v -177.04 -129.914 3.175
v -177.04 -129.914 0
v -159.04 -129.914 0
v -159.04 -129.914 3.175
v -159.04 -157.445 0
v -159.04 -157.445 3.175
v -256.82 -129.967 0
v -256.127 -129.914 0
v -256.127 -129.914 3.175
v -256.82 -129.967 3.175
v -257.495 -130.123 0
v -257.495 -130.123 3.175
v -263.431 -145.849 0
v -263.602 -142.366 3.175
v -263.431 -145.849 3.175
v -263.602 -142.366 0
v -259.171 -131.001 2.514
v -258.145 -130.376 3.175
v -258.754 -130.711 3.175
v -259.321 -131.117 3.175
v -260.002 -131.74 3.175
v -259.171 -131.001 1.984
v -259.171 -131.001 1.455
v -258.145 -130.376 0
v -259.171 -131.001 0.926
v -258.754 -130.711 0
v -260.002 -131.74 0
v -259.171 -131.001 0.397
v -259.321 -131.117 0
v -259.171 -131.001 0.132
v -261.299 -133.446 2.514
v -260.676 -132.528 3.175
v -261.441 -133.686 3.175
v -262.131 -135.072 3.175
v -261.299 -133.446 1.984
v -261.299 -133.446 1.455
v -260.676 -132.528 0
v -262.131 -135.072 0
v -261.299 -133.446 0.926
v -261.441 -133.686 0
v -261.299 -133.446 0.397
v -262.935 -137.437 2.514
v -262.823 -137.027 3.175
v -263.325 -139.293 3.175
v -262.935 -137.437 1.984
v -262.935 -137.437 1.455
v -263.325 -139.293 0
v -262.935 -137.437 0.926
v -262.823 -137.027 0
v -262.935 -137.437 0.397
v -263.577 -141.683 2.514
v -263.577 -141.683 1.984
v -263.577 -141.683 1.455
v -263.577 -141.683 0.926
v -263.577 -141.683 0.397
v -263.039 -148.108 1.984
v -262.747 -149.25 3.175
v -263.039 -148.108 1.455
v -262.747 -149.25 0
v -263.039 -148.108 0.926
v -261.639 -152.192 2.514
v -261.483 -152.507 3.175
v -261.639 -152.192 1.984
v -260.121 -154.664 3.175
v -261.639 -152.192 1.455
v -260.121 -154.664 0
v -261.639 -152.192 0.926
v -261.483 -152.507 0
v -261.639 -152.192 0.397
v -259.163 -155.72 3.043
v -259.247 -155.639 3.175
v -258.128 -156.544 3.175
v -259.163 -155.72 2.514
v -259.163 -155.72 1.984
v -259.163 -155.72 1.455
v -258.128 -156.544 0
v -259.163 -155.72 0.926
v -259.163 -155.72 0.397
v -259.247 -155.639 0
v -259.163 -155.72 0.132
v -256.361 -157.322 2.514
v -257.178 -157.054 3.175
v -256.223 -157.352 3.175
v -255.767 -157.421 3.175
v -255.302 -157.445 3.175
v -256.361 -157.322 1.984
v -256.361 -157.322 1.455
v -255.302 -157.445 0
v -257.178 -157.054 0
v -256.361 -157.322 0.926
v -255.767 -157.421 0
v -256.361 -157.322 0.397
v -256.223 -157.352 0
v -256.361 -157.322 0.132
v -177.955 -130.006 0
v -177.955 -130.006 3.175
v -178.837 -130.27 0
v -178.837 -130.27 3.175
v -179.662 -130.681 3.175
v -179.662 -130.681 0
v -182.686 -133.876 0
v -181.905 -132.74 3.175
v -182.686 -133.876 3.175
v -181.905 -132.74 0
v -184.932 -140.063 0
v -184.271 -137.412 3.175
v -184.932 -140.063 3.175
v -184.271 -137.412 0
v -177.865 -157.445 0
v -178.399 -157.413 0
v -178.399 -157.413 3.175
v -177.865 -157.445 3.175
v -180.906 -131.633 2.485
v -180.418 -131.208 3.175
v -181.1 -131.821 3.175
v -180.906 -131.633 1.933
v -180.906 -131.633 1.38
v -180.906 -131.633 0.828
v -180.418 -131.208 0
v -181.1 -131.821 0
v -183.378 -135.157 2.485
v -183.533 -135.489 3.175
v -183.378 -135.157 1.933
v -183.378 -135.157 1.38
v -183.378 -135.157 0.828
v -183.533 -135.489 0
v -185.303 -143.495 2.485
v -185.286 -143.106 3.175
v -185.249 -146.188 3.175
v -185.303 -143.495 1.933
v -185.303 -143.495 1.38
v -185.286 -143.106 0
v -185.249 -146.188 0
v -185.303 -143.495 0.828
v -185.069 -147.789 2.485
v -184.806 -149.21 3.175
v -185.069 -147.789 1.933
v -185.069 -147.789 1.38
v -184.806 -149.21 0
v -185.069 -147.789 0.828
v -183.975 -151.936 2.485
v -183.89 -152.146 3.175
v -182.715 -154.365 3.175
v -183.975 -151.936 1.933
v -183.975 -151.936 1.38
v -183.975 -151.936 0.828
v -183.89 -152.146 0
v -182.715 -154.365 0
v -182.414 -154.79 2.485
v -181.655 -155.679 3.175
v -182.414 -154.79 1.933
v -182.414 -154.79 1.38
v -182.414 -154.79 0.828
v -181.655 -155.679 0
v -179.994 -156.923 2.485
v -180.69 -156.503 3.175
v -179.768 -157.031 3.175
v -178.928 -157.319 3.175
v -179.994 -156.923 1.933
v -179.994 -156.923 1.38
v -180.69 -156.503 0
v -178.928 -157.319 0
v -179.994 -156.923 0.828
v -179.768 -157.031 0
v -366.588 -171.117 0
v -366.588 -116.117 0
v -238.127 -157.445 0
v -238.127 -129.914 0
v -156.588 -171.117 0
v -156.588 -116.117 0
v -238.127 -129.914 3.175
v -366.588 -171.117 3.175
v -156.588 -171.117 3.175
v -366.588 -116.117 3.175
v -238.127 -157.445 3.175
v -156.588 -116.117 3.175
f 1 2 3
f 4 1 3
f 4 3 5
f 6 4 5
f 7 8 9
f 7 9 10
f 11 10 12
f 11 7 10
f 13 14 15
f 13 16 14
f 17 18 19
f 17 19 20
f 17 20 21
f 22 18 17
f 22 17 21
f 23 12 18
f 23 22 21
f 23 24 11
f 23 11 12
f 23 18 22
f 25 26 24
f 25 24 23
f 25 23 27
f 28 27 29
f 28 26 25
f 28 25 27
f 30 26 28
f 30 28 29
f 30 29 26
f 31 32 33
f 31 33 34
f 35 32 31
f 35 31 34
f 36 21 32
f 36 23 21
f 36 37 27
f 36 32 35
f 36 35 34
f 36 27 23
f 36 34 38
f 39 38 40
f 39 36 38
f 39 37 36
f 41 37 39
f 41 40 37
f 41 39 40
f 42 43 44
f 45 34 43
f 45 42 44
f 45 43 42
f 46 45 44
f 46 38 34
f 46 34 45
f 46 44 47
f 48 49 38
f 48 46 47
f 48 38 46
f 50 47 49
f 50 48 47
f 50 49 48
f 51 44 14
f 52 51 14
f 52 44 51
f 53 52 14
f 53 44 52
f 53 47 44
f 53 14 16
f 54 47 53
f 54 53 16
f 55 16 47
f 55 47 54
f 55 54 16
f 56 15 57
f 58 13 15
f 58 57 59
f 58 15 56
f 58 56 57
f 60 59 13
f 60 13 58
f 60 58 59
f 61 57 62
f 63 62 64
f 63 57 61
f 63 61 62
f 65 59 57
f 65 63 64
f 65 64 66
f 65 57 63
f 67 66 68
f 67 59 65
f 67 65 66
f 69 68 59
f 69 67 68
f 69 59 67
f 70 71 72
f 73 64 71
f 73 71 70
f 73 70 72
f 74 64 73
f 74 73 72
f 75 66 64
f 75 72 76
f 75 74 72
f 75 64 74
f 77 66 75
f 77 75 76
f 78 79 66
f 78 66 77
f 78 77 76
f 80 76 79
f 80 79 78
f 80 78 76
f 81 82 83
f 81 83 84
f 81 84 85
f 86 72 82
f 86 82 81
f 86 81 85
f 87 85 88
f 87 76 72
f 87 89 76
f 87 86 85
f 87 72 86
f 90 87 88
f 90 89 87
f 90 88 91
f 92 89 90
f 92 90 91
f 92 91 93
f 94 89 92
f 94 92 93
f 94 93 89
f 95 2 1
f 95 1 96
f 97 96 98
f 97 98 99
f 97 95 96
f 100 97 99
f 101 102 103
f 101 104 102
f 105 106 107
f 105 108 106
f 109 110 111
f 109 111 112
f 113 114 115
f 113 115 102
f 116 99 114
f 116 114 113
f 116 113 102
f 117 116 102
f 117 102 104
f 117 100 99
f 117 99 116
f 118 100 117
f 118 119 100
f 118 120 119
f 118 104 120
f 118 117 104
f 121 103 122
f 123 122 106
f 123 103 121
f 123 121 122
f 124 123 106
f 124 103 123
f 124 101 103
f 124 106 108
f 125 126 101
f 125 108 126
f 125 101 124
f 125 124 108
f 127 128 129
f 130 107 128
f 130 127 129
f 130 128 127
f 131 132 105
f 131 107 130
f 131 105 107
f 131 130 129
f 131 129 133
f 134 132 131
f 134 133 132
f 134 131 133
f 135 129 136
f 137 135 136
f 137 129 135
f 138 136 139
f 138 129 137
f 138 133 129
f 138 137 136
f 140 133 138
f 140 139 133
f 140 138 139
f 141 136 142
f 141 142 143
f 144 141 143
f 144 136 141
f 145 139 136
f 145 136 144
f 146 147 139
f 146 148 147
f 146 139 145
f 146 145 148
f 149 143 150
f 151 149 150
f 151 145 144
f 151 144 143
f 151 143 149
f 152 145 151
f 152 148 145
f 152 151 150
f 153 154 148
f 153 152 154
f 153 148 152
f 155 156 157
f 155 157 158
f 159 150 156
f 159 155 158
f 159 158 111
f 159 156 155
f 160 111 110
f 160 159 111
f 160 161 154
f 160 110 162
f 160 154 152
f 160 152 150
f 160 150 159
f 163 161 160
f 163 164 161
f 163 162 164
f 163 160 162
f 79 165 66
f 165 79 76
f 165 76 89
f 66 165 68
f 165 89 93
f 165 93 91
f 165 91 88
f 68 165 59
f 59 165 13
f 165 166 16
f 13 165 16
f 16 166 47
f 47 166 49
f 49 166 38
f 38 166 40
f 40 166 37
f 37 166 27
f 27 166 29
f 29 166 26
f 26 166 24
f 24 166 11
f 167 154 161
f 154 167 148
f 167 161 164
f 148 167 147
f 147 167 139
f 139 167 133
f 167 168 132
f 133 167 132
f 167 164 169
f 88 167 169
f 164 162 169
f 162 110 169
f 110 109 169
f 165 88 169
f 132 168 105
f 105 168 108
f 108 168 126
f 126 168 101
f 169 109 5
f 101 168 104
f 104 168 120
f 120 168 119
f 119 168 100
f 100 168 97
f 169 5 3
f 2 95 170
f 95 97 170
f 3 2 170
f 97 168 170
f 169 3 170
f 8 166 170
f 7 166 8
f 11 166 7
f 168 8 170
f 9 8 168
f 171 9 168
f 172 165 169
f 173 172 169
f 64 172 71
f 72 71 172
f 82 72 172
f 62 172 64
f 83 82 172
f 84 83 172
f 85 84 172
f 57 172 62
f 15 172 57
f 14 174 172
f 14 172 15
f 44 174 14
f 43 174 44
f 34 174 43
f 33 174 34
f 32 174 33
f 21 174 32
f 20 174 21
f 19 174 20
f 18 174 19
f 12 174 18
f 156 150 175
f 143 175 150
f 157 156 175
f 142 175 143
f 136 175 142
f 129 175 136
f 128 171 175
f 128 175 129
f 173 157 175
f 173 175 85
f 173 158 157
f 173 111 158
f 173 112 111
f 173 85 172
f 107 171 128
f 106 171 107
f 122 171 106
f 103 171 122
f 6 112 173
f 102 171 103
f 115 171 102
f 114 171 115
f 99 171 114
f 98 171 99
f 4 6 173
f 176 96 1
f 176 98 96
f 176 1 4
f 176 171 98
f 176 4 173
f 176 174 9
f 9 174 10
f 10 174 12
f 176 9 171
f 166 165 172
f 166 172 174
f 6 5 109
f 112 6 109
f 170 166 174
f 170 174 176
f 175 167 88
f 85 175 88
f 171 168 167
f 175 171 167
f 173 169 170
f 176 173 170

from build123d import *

# Parameters (mm, degrees)
SKETCH1_W           = 210
SKETCH1_H           = 55
BOSS_EXTRUDE2_DEPTH = 3.175


with BuildPart() as part:
    # Sketch1 → Boss-Extrude2 (new body)
    with BuildSketch(Plane.XY):
        with Locations((-261.58829827, -143.616742272)):
            Rectangle(SKETCH1_W, SKETCH1_H)
        with BuildLine():
            Line((-256.126515872, -129.914493968), (-238.126515872, -129.914493968))
            Line((-238.126515872, -129.914493968), (-238.126515872, -157.445143065))
            Line((-238.126515872, -157.445143065), (-255.301947619, -157.445143065))
            add(Edge.make_bspline(
                [(-256.126515872, -129.914493968), (-256.132992045, -129.914493968), (-256.139468965, -129.91450781), (-256.512923163, -129.916105653), (-256.871976666, -129.961276413), (-257.575127126, -130.133923564), (-257.921636069, -130.263410906), (-258.571621418, -130.586176219), (-258.879489776, -130.78021096), (-259.462810842, -131.221200769), (-259.731937947, -131.463068859), (-260.235067773, -131.98012087), (-260.468977829, -132.255392686), (-260.907271385, -132.833942556), (-261.111268678, -133.137182585), (-261.673586312, -134.063668351), (-261.988251583, -134.710018031), (-262.527518193, -136.045634253), (-262.752464397, -136.739423267), (-263.117244618, -138.134526481), (-263.258245033, -138.837666692), (-263.46944613, -140.253506783), (-263.539513018, -140.966224727), (-263.613946735, -142.400531703), (-263.618118635, -143.125138919), (-263.535049841, -145.288890406), (-263.355011587, -146.710051192), (-262.880494808, -148.806791259), (-262.687866041, -149.499806054), (-262.222220804, -150.872074189), (-261.951824884, -151.54335372), (-261.482245138, -152.517058611), (-261.314868687, -152.836389762), (-260.955397443, -153.463120717), (-260.762547685, -153.771633607), (-260.145999628, -154.667359954), (-259.687952955, -155.223199045), (-258.899796605, -155.968133011), (-258.6177264, -156.202737546), (-258.026082675, -156.620875313), (-257.715719206, -156.805710538), (-257.223224925, -157.038052598), (-257.053549951, -157.108271733), (-256.710372006, -157.229384829), (-256.363038305, -157.331581483), (-256.007000457, -157.394158026), (-255.653394629, -157.434931154), (-255.476848891, -157.445143065), (-255.301947619, -157.445143065)],
                knots=[0.999724199, 0.999724199, 0.999724199, 0.999724199, 1, 1, 1.015625, 1.015625, 1.03125, 1.03125, 1.046875, 1.046875, 1.0625, 1.0625, 1.078125, 1.078125, 1.09375, 1.09375, 1.125, 1.125, 1.15625, 1.15625, 1.1875, 1.1875, 1.21875, 1.21875, 1.25, 1.25, 1.3125, 1.3125, 1.34375, 1.34375, 1.375, 1.375, 1.390625, 1.390625, 1.40625, 1.40625, 1.4375, 1.4375, 1.453125, 1.453125, 1.46875, 1.46875, 1.4765625, 1.4765625, 1.484375, 1.4921875, 1.4921875, 1.499694839, 1.499694839, 1.499694839, 1.499694839], degree=3))
        make_face(mode=Mode.SUBTRACT)
        with BuildLine():
            Line((-177.040464824, -129.914493131), (-159.040464824, -129.914493131))
            Line((-159.040464824, -129.914493131), (-159.040464824, -157.445142267))
            Line((-159.040464824, -157.445142267), (-177.864702912, -157.445142267))
            add(Edge.make_bspline(
                [(-177.040464824, -129.914493131), (-177.400259083, -129.914493131), (-177.752698521, -129.956434579), (-178.450508164, -130.118281465), (-178.798446548, -130.241521216), (-179.784142425, -130.703186625), (-180.381814164, -131.138745878), (-181.168722929, -131.880440702), (-181.414752425, -132.143698936), (-181.879762188, -132.696854414), (-182.099643917, -132.988258366), (-182.714813277, -133.884005529), (-183.067807311, -134.509863609), (-183.688975752, -135.804188375), (-183.956661427, -136.472900571), (-184.418821119, -137.847102378), (-184.60922195, -138.540686475), (-185.076516236, -140.637355053), (-185.251107732, -142.05642333), (-185.328407938, -144.213722779), (-185.322641079, -144.939527832), (-185.245543482, -146.373081328), (-185.174539397, -147.084089599), (-184.963362414, -148.493812341), (-184.823302583, -149.192546909), (-184.463885552, -150.575922036), (-184.244647865, -151.261133883), (-183.705821701, -152.611490757), (-183.39185114, -153.263426638), (-182.832888757, -154.195423531), (-182.630581648, -154.499761516), (-182.197133509, -155.079419539), (-181.965897633, -155.355342095), (-181.468748984, -155.873956834), (-181.202924715, -156.116733829), (-180.771061379, -156.449154259), (-180.620764556, -156.555065499), (-180.313366279, -156.750731797), (-179.998412932, -156.931007765), (-179.667152799, -157.078065401), (-179.32695585, -157.20691797), (-179.15114653, -157.262494593), (-178.620859868, -157.396113578), (-178.262764543, -157.442154367), (-177.888298624, -157.445095998), (-177.876505167, -157.445142267), (-177.864702912, -157.445142267)],
                knots=[0.000281563, 0.000281563, 0.000281563, 0.000281563, 0.015625, 0.015625, 0.03125, 0.03125, 0.0625, 0.0625, 0.078125, 0.078125, 0.09375, 0.09375, 0.125, 0.125, 0.15625, 0.15625, 0.1875, 0.1875, 0.25, 0.25, 0.28125, 0.28125, 0.3125, 0.3125, 0.34375, 0.34375, 0.375, 0.375, 0.40625, 0.40625, 0.421875, 0.421875, 0.4375, 0.4375, 0.453125, 0.453125, 0.4609375, 0.4609375, 0.46875, 0.4765625, 0.4765625, 0.484375, 0.484375, 0.5, 0.5, 0.500507651, 0.500507651, 0.500507651, 0.500507651], degree=3))
        make_face(mode=Mode.SUBTRACT)
    extrude(amount=BOSS_EXTRUDE2_DEPTH)


solid = part.part
